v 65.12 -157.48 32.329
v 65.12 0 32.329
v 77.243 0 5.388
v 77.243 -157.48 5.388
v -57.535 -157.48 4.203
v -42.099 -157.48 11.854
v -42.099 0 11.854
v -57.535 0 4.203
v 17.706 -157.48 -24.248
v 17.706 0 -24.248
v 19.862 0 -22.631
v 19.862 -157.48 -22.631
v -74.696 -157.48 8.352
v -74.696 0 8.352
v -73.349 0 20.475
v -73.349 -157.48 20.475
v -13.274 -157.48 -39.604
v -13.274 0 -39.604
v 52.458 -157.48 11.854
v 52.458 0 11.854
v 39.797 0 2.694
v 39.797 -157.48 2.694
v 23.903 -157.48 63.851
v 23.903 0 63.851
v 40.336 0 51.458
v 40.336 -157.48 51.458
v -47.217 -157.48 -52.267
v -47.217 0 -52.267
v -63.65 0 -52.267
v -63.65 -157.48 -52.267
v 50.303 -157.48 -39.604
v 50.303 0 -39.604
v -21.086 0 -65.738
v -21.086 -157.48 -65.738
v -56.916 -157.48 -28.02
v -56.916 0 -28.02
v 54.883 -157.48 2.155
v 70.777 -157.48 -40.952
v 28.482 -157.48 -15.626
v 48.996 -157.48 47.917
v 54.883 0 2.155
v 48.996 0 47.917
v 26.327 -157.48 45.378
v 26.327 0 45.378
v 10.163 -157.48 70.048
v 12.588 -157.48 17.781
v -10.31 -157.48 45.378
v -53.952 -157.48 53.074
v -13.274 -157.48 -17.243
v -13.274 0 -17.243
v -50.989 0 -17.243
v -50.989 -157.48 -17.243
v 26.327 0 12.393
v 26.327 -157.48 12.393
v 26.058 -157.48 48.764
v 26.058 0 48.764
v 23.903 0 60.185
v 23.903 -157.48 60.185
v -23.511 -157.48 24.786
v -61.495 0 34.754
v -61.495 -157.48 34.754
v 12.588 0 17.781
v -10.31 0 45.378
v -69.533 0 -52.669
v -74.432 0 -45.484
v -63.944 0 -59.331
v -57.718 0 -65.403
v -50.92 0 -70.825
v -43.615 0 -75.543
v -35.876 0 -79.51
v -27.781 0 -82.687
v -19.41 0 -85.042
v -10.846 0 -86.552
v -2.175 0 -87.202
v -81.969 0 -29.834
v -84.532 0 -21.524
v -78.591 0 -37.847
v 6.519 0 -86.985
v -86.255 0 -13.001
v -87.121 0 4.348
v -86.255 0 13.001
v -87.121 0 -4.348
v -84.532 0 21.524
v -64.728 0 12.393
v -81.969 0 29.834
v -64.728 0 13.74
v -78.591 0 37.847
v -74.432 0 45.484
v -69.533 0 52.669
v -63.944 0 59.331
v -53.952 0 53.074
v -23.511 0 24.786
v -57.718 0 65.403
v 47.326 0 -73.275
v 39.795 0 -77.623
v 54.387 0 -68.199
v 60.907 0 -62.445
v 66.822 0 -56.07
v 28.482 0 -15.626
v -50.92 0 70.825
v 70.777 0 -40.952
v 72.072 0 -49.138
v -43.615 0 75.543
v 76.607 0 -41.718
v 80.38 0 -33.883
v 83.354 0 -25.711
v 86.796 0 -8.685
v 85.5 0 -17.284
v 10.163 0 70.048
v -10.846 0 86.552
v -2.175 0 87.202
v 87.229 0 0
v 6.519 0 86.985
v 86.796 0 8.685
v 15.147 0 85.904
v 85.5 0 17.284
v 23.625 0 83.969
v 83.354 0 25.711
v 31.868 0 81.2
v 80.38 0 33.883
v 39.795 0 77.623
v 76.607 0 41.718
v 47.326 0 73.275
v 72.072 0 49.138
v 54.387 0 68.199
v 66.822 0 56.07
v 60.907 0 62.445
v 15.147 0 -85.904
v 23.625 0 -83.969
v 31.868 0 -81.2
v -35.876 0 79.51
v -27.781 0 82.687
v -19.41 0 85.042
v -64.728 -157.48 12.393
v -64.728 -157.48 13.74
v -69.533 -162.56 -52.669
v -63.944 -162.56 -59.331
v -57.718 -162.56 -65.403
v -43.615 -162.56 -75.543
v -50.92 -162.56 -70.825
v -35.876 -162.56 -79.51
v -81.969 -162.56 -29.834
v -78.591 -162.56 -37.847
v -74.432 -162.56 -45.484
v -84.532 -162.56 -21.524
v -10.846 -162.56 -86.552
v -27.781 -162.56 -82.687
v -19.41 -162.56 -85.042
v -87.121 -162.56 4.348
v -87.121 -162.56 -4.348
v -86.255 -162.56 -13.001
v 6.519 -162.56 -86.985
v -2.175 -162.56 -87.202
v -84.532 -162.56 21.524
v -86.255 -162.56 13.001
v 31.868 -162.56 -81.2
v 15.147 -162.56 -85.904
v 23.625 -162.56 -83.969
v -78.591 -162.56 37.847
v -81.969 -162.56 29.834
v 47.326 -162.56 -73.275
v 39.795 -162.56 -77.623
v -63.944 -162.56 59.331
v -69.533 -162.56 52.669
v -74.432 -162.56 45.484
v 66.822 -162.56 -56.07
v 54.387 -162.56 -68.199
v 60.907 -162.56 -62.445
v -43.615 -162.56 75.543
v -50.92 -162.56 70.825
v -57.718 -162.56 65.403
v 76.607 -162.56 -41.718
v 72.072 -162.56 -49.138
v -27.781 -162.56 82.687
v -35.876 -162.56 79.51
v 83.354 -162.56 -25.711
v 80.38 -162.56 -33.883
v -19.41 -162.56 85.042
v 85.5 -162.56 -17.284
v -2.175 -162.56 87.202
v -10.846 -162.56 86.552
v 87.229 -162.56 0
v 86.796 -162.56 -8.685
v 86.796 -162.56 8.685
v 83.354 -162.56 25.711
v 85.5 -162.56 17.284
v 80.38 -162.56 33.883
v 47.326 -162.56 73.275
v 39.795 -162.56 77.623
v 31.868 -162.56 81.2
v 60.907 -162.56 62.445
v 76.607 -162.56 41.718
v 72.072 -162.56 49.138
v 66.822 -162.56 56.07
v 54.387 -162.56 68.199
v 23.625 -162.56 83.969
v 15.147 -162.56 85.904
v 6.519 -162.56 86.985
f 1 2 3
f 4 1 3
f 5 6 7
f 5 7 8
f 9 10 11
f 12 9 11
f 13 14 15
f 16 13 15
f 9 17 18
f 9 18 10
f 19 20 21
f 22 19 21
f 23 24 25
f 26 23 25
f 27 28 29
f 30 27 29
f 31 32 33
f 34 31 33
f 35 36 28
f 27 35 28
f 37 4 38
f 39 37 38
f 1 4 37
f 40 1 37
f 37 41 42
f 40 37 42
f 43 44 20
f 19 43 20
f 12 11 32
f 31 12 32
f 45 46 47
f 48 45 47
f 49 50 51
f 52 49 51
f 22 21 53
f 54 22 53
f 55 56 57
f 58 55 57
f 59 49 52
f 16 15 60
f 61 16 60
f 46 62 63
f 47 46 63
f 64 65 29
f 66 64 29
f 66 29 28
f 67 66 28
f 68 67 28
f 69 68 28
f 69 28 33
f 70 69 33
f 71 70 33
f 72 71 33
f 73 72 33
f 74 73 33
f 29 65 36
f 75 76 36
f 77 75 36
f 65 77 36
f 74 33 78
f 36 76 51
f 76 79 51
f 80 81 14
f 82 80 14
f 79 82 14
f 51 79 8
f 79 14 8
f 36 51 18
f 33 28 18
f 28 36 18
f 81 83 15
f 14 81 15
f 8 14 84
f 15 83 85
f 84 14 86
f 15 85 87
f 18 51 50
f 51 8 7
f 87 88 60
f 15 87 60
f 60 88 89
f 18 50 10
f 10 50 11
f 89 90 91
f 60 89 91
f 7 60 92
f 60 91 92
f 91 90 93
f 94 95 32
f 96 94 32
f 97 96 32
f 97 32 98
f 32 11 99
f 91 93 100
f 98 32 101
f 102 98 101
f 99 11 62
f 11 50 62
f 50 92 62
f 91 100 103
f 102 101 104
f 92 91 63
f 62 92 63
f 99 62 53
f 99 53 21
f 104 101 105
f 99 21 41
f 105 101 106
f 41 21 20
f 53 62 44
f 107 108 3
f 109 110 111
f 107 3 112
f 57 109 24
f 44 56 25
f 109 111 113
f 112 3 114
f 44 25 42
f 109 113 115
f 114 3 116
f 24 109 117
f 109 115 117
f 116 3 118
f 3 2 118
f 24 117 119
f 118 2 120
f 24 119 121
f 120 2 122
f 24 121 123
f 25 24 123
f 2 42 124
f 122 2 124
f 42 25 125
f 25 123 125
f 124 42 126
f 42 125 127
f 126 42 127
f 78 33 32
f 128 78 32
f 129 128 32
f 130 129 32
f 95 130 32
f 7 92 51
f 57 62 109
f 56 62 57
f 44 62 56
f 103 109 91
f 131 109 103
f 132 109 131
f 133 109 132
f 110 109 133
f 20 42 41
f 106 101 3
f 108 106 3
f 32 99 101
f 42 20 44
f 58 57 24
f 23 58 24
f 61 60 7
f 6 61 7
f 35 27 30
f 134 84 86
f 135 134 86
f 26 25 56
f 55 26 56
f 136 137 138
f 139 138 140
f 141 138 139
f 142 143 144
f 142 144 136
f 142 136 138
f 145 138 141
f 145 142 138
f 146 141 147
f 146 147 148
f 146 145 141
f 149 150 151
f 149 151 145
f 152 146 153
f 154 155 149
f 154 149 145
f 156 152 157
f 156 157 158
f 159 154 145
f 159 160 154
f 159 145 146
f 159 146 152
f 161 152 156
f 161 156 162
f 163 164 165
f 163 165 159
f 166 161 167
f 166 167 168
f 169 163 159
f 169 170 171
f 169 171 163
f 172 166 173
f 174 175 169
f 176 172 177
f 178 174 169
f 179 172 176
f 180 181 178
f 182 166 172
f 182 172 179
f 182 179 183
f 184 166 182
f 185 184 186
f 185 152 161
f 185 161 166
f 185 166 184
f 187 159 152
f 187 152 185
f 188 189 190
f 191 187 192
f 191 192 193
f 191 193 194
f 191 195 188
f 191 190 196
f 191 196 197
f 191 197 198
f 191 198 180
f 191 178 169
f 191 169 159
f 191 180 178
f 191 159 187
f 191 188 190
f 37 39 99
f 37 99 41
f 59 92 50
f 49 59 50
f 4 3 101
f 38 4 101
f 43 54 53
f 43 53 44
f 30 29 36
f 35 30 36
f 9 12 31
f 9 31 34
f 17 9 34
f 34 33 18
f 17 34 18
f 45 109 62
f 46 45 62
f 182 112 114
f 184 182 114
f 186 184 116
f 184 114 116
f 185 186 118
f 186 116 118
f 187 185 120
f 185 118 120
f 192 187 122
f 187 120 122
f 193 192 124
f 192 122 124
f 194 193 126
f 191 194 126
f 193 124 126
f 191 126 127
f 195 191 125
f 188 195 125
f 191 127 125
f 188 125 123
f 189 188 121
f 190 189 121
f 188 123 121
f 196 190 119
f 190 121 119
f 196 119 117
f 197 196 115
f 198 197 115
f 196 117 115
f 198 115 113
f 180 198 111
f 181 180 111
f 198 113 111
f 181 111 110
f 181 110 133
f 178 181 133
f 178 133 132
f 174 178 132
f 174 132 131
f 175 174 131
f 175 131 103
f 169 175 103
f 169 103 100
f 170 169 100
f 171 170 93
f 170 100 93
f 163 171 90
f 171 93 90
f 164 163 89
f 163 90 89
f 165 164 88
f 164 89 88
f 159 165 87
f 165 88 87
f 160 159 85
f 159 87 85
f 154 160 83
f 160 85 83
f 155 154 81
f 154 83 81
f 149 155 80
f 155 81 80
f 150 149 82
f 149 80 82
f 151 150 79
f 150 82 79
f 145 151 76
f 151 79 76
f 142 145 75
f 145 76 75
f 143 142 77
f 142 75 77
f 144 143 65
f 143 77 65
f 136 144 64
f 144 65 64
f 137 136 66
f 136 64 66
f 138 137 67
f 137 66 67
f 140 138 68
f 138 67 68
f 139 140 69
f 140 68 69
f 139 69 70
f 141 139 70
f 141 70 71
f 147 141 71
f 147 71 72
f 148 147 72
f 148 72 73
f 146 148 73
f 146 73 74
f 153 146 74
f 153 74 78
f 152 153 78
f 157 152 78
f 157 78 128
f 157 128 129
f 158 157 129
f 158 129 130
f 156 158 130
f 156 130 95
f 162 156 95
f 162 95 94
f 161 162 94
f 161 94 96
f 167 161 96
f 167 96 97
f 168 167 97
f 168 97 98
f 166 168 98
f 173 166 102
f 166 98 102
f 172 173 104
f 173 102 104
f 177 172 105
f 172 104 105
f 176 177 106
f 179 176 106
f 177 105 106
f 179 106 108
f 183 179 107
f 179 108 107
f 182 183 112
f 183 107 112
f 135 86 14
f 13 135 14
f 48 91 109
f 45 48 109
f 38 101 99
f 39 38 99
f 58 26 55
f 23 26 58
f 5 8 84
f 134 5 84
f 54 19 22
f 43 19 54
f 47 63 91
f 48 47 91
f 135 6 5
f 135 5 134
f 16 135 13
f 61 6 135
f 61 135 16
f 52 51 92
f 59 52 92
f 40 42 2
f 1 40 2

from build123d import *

# Parameters (mm, degrees)
F2_DEPTH = 162.56
F1_R     = 87.2293400051
F5_DEPTH = 157.48
F7_DEPTH = 157.48
F9_DEPTH = 157.48


with BuildPart() as f2:
    # F0 (on Front) → F2 (new body)
    with BuildSketch(Plane.XZ):
        Polygon((-3.7715153303, 16.7024247348), (2.6939406525, 35.8293950558), (-36.9069688022, 38.2539406419), (-21.2821215391, 11.8533335626), align=None)
    extrude(amount=F2_DEPTH)


with BuildPart() as f2b:
    # F1 (on Front) → F2, piece 2 (new body)
    with BuildSketch(Plane.XZ):
        Circle(F1_R)
    extrude(amount=F2_DEPTH)

    # F4 (on face) → F5 (cut)
    with BuildSketch(Plane(origin=(0, 0, 0), x_dir=(-1, 0, 0), z_dir=(0, 1, 0))):
        Polygon((-26.3271015137, 45.3784566633), (-52.4583123624, 11.8539193645), (-39.796795696, 2.6937914081), (-26.3271015137, 12.3927500099), align=None)
    extrude(amount=-F5_DEPTH, mode=Mode.SUBTRACT)

    # F6 (on face) → F7 (cut)
    with BuildSketch(Plane(origin=(0, 0, 0), x_dir=(-1, 0, 0), z_dir=(0, 1, 0))):
        Polygon((-12.5880083069, 17.781060189), (10.3104757145, 45.3784566633), (53.9522953331, 53.074490279), (-10.1634636521, 70.0476691127), align=None)
        Polygon((50.9889610112, -17.2429550439), (23.5107783228, 24.7858650982), (13.2738091052, -17.2429550439), align=None)
        Polygon((73.3486637473, 20.4752162099), (61.4953264594, 34.7542390227), (42.0989617705, 11.8539193645), (57.5345901374, 4.2026060604), (64.728051424, 12.3927500099), (64.728051424, 13.7398280203), (74.6956318617, 8.3515178412), align=None)
        Polygon((-17.7064947784, -24.2477599531), (-19.8616459966, -22.6312670857), (-50.3031611443, -39.6044403315), (21.0862327367, -65.7377541065), (13.2738091052, -39.6044403315), align=None)
    extrude(amount=-F7_DEPTH, mode=Mode.SUBTRACT)

    # F8 (on face) → F9 (cut)
    with BuildSketch(Plane(origin=(0, 0, 0), x_dir=(-1, 0, 0), z_dir=(0, 1, 0))):
        Polygon((-48.995775217, 47.9173291132), (-65.1198253036, 32.3294997215), (-77.2425532341, 5.3879469633), (-70.7771033049, -40.9515202045), (-28.4822527319, -15.6264640391), (-54.8828579485, 2.1549605299), align=None)
        Polygon((-23.902554065, 60.1852526106), (-23.902554065, 63.8511106372), (-40.3355844319, 51.4579974115), (-26.0577071458, 48.7638451159), align=None)
        Polygon((63.6504739523, -52.2669777274), (56.9156296551, -28.0195791274), (47.2174473107, -52.2669777274), align=None)
    extrude(amount=-F9_DEPTH, mode=Mode.SUBTRACT)


solid = f2b.part
